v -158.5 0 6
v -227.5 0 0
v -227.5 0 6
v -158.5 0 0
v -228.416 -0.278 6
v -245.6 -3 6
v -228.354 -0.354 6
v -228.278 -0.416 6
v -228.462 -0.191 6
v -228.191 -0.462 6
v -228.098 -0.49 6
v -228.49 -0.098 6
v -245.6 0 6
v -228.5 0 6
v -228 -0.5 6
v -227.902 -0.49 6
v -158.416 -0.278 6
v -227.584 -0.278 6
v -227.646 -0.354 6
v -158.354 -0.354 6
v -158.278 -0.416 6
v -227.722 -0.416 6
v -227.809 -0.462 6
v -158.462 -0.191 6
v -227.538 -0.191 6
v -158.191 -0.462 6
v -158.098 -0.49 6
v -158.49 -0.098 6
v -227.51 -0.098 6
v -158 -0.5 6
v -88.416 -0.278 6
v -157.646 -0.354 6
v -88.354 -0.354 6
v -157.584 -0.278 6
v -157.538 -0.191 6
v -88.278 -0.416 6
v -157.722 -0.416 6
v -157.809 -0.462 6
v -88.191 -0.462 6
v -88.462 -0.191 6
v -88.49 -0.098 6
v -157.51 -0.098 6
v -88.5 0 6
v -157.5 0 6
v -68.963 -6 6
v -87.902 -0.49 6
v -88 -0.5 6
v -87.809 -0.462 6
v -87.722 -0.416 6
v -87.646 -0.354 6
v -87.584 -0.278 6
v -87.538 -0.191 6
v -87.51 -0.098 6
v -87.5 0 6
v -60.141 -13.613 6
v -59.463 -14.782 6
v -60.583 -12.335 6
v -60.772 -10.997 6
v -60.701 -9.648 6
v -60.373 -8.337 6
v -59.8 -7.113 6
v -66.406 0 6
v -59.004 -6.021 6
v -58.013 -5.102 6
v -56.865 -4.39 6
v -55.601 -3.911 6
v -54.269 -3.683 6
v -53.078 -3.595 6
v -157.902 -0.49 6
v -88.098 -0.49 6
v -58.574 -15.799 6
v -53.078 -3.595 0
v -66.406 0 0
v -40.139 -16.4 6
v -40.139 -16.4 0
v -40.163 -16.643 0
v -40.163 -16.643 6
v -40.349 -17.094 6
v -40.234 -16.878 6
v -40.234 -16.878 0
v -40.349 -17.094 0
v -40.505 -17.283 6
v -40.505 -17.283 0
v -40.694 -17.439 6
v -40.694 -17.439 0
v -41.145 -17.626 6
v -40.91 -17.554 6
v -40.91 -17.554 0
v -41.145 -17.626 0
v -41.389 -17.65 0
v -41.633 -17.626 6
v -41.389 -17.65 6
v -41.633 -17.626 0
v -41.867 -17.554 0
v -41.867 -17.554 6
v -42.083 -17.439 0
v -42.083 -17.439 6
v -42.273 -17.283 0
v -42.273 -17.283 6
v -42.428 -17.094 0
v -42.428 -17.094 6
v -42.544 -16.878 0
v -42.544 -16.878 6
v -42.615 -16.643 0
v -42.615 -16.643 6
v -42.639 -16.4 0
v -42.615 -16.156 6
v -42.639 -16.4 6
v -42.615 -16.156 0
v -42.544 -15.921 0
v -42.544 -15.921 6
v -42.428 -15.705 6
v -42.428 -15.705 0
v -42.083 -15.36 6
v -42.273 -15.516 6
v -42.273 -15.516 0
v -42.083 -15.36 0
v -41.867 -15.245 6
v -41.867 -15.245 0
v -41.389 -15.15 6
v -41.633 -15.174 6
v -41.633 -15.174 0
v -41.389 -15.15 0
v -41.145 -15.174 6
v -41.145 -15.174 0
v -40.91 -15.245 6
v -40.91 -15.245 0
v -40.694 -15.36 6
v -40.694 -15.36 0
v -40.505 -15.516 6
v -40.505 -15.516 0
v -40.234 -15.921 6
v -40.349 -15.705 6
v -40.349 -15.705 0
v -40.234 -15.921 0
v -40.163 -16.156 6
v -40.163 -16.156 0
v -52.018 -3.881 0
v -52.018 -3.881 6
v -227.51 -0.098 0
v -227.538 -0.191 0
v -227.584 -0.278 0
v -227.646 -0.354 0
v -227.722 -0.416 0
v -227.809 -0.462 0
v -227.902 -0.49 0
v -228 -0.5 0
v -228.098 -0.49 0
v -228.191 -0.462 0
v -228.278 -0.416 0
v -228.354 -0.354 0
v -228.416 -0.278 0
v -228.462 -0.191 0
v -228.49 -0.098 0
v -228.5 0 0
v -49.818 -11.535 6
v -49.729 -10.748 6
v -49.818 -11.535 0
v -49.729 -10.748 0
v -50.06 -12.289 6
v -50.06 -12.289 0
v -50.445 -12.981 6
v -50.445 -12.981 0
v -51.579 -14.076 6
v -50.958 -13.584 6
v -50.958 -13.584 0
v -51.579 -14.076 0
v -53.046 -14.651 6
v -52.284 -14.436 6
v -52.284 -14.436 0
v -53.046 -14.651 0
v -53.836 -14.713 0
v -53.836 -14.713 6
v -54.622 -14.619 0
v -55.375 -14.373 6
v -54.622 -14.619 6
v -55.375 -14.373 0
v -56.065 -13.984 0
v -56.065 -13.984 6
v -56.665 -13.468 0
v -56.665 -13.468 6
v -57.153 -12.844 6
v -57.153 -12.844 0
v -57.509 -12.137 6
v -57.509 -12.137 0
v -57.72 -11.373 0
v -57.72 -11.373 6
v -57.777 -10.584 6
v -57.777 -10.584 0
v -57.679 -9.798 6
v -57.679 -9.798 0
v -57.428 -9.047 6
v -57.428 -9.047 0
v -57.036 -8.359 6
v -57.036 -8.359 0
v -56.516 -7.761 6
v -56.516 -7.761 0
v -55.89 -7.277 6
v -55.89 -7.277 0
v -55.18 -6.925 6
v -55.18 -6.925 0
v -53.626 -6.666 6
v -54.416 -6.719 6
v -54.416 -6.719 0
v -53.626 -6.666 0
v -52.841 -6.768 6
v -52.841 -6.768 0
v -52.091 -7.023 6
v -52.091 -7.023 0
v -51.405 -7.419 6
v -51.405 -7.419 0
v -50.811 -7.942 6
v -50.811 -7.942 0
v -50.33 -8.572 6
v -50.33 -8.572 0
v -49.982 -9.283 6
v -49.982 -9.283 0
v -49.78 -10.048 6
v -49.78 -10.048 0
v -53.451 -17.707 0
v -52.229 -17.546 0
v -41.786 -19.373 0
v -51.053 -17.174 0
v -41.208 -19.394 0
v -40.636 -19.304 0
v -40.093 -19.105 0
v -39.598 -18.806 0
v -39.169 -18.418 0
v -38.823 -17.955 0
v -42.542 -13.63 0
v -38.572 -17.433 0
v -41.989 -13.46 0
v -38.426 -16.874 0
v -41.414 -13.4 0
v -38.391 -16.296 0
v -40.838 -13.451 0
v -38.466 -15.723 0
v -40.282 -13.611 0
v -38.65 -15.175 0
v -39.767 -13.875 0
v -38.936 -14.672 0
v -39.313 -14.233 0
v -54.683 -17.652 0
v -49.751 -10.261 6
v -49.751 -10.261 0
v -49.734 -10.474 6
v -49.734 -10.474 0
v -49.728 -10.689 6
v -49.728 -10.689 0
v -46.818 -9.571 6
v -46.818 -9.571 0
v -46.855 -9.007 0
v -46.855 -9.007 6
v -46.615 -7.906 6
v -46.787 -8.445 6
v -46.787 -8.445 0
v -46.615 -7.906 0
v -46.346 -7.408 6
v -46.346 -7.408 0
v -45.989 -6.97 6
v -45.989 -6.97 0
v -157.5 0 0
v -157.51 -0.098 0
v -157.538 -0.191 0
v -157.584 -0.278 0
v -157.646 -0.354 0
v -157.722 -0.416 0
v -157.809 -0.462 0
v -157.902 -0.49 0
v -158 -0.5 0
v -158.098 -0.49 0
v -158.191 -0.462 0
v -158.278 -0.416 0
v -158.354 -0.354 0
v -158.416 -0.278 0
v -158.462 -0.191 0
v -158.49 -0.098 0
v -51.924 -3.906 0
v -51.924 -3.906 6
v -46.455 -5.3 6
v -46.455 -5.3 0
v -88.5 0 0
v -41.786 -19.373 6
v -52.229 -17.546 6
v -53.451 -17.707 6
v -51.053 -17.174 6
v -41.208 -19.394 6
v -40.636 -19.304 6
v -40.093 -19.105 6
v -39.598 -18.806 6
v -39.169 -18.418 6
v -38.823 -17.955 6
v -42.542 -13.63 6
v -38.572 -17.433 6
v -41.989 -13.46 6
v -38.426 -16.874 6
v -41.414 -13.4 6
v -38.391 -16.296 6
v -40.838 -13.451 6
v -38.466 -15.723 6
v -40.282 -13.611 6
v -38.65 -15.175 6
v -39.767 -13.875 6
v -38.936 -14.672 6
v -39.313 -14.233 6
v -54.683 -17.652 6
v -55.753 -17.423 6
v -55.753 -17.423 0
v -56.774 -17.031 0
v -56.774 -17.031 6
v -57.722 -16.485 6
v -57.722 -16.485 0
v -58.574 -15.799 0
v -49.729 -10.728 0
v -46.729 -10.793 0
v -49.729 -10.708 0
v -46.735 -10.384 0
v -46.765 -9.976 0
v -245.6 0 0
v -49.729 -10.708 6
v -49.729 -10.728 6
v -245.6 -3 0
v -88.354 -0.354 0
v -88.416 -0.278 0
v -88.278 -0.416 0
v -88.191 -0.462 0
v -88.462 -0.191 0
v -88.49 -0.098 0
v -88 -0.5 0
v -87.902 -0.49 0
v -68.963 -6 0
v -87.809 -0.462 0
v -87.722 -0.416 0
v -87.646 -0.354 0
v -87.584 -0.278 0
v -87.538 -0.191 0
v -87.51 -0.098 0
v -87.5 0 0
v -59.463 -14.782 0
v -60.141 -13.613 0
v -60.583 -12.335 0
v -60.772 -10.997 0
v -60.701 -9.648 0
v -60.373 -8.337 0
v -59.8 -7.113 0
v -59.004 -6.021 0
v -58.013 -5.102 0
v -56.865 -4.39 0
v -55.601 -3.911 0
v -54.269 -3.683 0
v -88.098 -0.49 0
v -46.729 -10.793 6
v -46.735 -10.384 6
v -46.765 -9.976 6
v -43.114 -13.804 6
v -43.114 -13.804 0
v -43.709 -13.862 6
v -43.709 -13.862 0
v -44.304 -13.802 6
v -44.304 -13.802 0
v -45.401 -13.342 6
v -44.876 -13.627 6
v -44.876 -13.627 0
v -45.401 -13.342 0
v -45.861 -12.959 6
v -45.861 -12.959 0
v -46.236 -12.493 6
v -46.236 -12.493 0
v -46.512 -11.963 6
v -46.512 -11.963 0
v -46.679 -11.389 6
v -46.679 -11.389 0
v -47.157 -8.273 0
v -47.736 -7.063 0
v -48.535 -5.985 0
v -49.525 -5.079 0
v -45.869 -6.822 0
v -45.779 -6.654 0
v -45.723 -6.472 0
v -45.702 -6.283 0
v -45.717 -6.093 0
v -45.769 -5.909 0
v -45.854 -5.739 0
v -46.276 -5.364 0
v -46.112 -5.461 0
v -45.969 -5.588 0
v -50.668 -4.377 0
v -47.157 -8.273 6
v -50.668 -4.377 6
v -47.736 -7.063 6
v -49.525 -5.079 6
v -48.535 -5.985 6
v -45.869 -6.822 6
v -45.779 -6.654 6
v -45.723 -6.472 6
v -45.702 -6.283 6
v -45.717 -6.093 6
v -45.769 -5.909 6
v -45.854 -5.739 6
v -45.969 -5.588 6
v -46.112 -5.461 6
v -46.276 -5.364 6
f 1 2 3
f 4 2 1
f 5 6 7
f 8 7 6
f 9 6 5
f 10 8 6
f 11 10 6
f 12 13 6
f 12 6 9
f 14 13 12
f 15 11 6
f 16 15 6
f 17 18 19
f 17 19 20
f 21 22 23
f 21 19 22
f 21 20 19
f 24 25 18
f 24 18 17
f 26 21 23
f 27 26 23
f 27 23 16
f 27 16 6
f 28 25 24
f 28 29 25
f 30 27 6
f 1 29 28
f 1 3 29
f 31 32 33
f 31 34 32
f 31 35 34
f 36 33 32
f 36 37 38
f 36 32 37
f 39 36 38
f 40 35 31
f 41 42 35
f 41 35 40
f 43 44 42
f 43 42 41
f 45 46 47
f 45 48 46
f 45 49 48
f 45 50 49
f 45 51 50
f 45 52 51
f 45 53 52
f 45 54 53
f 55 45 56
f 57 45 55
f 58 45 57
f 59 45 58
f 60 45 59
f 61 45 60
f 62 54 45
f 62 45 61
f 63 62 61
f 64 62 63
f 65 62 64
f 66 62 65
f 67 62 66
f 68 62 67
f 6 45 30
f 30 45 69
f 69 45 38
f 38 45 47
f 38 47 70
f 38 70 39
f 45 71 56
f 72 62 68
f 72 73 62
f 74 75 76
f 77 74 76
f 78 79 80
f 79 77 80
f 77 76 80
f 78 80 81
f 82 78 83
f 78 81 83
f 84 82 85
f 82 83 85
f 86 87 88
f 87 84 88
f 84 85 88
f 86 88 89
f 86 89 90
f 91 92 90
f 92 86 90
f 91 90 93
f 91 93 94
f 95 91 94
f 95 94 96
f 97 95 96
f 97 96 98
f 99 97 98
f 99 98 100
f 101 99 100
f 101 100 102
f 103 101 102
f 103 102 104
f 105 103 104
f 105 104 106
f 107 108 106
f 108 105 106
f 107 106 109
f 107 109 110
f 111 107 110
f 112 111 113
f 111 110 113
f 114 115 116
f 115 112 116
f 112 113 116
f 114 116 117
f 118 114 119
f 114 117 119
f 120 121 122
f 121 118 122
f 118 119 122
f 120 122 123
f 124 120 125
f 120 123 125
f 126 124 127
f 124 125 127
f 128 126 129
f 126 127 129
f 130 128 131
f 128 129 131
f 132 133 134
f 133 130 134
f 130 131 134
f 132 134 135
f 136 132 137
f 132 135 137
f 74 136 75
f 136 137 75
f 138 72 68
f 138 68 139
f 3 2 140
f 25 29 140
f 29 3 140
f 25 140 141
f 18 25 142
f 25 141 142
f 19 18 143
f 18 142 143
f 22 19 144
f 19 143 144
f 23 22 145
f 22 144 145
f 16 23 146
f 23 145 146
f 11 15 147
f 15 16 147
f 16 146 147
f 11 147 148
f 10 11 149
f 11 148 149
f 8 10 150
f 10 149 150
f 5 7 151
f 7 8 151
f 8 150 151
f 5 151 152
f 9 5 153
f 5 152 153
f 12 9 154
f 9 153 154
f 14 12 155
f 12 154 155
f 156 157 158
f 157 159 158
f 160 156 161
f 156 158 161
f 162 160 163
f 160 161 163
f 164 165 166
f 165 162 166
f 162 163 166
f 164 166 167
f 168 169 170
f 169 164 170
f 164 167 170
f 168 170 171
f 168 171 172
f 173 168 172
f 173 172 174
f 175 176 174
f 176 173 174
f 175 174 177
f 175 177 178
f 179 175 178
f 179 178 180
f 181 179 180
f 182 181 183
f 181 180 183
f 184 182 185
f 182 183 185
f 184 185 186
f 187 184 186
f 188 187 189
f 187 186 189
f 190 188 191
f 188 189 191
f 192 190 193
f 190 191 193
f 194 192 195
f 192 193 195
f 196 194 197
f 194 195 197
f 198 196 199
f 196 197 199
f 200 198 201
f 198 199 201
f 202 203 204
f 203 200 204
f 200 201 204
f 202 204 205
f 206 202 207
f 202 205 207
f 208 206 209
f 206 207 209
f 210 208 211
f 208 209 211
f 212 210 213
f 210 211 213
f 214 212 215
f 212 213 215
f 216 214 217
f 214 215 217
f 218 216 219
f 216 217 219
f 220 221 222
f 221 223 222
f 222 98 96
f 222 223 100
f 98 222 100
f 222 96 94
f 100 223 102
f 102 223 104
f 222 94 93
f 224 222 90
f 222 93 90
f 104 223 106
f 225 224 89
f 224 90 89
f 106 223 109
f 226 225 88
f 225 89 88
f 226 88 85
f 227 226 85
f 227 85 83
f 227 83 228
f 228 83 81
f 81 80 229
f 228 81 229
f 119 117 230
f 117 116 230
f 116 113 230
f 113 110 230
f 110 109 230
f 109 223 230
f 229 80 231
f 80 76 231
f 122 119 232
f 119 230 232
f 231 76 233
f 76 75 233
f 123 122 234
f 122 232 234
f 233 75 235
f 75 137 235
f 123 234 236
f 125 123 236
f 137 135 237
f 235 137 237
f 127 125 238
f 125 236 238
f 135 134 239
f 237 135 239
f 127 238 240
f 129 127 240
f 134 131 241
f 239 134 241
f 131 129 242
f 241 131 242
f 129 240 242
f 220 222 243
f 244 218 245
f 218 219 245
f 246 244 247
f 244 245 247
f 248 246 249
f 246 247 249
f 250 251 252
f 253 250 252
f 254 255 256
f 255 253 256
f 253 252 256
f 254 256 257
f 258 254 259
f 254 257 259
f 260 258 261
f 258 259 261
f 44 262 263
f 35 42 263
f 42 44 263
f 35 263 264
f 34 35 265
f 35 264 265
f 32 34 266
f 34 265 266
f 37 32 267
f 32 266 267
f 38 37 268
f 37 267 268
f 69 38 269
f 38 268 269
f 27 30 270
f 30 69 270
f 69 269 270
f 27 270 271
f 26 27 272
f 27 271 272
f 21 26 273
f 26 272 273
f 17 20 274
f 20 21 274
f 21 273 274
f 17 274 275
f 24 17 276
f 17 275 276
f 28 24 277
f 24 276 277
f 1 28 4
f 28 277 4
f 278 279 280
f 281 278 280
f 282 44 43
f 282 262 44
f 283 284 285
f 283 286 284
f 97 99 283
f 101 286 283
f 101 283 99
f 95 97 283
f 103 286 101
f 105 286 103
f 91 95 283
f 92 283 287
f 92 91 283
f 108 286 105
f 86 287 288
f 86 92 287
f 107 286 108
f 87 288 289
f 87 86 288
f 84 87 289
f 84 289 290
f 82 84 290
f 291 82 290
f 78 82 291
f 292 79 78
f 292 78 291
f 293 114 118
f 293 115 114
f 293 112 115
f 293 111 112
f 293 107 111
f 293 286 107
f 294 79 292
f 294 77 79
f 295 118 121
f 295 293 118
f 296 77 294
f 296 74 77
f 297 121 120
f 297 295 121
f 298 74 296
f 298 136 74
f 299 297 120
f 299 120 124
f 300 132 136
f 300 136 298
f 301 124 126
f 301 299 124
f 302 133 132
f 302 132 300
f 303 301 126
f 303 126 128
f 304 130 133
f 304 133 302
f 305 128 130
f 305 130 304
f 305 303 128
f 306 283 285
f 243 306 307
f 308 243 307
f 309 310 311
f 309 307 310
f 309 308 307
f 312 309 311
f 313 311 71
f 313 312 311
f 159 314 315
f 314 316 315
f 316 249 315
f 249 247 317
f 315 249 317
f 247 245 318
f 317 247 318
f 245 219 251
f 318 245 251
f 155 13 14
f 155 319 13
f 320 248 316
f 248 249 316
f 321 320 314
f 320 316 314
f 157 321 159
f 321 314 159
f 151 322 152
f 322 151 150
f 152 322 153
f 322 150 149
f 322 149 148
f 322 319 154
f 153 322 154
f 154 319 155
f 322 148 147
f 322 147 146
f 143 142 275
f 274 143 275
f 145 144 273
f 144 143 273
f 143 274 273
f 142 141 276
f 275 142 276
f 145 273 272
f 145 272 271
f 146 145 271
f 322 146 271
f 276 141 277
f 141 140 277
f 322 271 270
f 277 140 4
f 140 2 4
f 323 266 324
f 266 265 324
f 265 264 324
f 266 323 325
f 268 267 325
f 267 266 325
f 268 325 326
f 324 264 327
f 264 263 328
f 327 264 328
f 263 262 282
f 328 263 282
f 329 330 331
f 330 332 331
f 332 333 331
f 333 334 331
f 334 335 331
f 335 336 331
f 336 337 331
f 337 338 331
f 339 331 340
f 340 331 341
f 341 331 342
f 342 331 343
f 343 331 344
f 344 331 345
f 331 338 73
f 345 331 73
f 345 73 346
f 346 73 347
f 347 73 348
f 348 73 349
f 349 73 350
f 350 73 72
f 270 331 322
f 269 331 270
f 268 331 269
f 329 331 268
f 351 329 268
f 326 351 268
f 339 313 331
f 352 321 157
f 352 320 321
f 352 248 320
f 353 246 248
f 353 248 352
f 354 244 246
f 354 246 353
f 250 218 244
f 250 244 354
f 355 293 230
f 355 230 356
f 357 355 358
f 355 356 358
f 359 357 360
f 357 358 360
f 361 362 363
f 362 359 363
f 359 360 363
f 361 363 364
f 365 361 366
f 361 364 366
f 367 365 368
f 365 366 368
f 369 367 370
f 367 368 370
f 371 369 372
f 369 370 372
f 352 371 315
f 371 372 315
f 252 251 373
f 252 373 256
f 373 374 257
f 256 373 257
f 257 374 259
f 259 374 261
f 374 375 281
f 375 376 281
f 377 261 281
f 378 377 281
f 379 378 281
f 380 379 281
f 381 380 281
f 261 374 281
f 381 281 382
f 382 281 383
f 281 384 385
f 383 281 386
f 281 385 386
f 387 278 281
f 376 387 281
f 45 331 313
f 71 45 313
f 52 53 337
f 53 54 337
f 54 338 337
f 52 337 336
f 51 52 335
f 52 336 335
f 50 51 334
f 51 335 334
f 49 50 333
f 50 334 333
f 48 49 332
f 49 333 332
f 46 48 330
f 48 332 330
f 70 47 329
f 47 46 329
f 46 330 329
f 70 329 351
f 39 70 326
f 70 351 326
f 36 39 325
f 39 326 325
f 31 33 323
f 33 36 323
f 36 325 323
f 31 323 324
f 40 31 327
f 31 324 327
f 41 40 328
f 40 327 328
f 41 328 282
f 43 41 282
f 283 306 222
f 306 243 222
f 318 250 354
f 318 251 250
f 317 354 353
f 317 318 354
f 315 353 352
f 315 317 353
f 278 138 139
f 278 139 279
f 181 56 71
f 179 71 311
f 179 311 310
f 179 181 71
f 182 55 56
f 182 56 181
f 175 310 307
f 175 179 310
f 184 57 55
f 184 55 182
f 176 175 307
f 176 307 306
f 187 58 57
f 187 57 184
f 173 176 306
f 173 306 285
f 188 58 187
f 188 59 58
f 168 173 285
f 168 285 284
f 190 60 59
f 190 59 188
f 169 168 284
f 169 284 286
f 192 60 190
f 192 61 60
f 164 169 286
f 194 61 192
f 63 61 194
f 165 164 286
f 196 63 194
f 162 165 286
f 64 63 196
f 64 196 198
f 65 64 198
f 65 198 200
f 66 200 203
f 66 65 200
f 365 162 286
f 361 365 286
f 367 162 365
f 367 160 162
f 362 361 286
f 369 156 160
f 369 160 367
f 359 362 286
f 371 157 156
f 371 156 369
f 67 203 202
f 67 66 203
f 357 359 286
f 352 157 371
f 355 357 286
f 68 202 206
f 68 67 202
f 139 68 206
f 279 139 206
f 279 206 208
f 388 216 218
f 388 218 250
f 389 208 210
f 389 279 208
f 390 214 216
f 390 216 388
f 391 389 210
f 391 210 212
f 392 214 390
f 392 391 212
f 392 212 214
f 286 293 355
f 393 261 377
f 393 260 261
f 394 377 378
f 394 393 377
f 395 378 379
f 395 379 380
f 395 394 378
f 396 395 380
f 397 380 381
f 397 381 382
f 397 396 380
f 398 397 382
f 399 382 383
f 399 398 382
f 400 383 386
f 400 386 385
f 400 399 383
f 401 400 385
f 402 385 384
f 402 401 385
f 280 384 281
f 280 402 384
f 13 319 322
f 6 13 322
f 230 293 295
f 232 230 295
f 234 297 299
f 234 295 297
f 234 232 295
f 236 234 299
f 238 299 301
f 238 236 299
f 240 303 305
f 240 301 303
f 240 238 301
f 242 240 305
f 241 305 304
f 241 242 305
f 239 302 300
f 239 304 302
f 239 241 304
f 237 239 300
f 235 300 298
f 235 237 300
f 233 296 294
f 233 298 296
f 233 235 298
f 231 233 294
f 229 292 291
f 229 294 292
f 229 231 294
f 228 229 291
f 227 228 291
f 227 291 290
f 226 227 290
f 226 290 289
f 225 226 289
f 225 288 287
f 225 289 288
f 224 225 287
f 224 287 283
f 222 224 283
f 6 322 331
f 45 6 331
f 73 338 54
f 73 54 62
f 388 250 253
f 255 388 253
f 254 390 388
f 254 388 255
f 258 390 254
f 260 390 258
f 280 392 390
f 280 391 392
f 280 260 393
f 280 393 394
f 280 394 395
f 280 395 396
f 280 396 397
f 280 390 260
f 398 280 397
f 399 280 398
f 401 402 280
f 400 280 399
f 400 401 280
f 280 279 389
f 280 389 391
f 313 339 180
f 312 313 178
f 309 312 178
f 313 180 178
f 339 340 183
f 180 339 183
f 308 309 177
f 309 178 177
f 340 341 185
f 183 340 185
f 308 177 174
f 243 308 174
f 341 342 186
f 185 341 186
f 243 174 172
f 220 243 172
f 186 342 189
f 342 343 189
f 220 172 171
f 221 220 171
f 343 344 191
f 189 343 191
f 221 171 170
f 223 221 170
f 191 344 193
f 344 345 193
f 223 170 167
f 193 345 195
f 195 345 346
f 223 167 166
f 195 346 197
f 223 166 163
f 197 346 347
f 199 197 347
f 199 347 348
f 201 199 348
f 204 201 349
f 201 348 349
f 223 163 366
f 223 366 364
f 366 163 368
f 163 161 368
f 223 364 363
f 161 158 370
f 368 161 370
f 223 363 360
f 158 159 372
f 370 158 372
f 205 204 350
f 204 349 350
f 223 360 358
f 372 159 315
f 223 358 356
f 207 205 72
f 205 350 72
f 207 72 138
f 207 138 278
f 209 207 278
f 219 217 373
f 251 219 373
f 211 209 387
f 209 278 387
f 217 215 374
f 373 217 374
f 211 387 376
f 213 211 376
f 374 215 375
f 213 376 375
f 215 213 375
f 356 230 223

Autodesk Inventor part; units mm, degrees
ref_plane "YZ Plane" through (0, 0, 0) normal (1, 0, 0) x (0, 1, 0)
ref_plane "XZ Plane" through (0, 0, 0) normal (0, 1, 0) x (-1, 0, 0)
ref_plane "XY Plane" through (0, 0, 0) normal (0, 0, 1) x (1, 0, 0)
sketch "スケッチ1" plane through (0, 0, 0) normal (0, 0, 1) x (1, 0, 0)
  line L0 (0, 0) -> (0, -3)
  line L1 (0, 0) -> (-15, 0)
  line L2 (-15, 0) -> (-15, -3)
  line L3 (-15, -3) -> (-30, -3)
  line L4 (-30, -3) -> (-30, 0)
  line L5 (-30, 0) -> (-45, 0)
  line L6 (-45, 0) -> (-45, -3)
  line L7 (-245.5996, 0) -> (-66.4062, 0)
  line L8 (-66.4062, 0) -> (-51.9242, -3.906)
  line L9 (-245.5996, 0) -> (-245.5996, -3)
  line L10 (-245.5996, -3) -> (-68.9626, -6)
  line L11 (-68.9626, -6) -> (-58.5737, -15.799)
  circle A0 centre (-53.7535, -10.6886) radius 4.025
  circle A1 centre (-53.7535, -10.6886) radius 1.5
  line L12 (0, -3) -> (0, -9)
  arc A2 (-54.2694, -3.6826) -> (-51.0532, -17.1739) centre (-53.7535, -10.6886) ccw
  line L13 (-54.2694, -3.6826) -> (-45, -3)
  line L14 (-51.0532, -17.1739) -> (-31.4218, -9)
  line L15 (-31.4218, -9) -> (0, -9)
  arc A3 (-46.7293, -10.7926) -> (-42.5418, -13.63) centre (-43.7046, -10.8374) ccw
  circle A4 centre (-43.7046, -10.8374) radius 1.5
  line L16 (-54.6828, -17.6519) -> (-41.7856, -19.3732)
  arc A5 (-41.7856, -19.3732) -> (-42.5418, -13.63) centre (-41.3887, -16.3996) ccw
  arc A6 (-58.5737, -15.799) -> (-54.6828, -17.6519) centre (-53.7535, -10.6886) ccw
  arc A7 (-46.7293, -10.7926) -> (-51.9242, -3.906) centre (-53.7535, -10.6886) ccw
  line L17 (-42, -3) -> (-33, -3)
  line L18 (-33, -3) -> (-33, -6)
  line L19 (-33, -6) -> (-42, -6)
  line L20 (-42, -6) -> (-42, -3)
  line L21 (-12, -3) -> (-3, -3)
  line L22 (-3, -3) -> (-3, -6)
  line L23 (-3, -6) -> (-12, -6)
  line L24 (-12, -6) -> (-12, -3)
  circle A8 centre (-40.95, -3) radius 1.05
  circle A9 centre (-34.05, -3) radius 1.05
  circle A10 centre (-34.05, -6) radius 1.05
  circle A11 centre (-40.95, -6) radius 1.05
  circle A12 centre (-10.95, -3) radius 1.05
  circle A13 centre (-4.05, -3) radius 1.05
  circle A14 centre (-4.05, -6) radius 1.05
  circle A15 centre (-10.95, -6) radius 1.05
  circle A16 centre (-28.95, -3) radius 1.05
  circle A17 centre (-16.05, -3) radius 1.05
  circle A18 centre (-41.3887, -16.3996) radius 1.25
  line L25 (-15.5802, -9) -> (-15.5802, -14)
  line L26 (-15.5802, -14) -> (-4.3492, -14)
  line L27 (-4.3492, -14) -> (-4.3492, -12)
  line L28 (-4.3492, -12) -> (-11.5802, -12)
  arc A19 (-11.5802, -9) -> (-11.5802, -12) centre (-11.5802, -10.5) ccw
  line L29 (-43.7046, -10.8374) -> (-53.7535, -10.6886)
  line L30 (-53.7535, -10.6886) -> (-43.8314, -9.0902)
  arc A20 (-43.0841, -6.159) -> (-46.8179, -9.5713) centre (-43.8314, -9.0902) ccw
  line L31 (-52.0181, -3.8813) -> (-43.0841, -6.159)
  circle A21 centre (-88, 0) radius 0.5
  circle A22 centre (-158, 0) radius 0.5
  circle A23 centre (-228, 0) radius 0.5
  point P0 (-5.1, -6)
  point P1 (-9.9, -6)
  point P2 (-12, -6)
  point P3 (-9.9, -3)
  point P4 (-5.1, -3)
  point P5 (-33, -3)
  point P6 (-33, -6)
  point P7 (-35.1, -6)
  point P8 (-39.9, -6)
  point P9 (-42, -6)
  point P10 (-42, -3)
  point P11 (-39.9, -3)
  point P12 (-35.1, -3)
  point P13 (-17.1, -3)
  point P14 (-27.9, -3)
  point P15 (-58.5737, -15.799)
  point P16 (-54.6828, -17.6519)
  point P17 (-51.9709, -3.8934)
  point P18 (-46.8179, -9.5713)
  point P19 (-87.5, 0)
  point P20 (-88.5, 0)
  point P21 (-157.5, 0)
  point P22 (-158.5, 0)
  point P23 (-227.5, 0)
  point P24 (-228.5, 0)
  dimension "d0" = 3
  dimension "d1" = 15
  dimension "d2" = 3
  dimension "d3" = 15
  dimension "d4" = 15
  dimension "d5" = 3
  dimension "d6" = 3
  dimension "d7" = 8.05
  dimension "d8" = 3
  dimension "d9" = 6
  dimension "d10" = 6
  dimension "d11" = 6.05
  dimension "d12" = 3
  dimension "d13" = 9
  dimension "d14" = 3
  dimension "d15" = 9
  dimension "d16" = 3
  dimension "d17" = 3
  dimension "d18" = 3
  dimension "d19" = 3
  dimension "d20" = 3
  dimension "d21" = 3
  dimension "d22" = 2.1
  dimension "d23" = 2.1
  dimension "d24" = 2.1
  dimension "d25" = 2.1
  dimension "d26" = 2.1
  dimension "d27" = 2.1
  dimension "d28" = 2.1
  dimension "d29" = 2.1
  dimension "d30" = 2.1
  dimension "d31" = 2.1
  dimension "d32" = 2.5
  dimension "d33" = 3
  dimension "d34" = 3
  dimension "d35" = 2
  dimension "d36" = 4
  dimension "d39" = 10
  dimension "d42" = 1
  dimension "d43" = 43
  dimension "d44" = 1
  dimension "d45" = 1
  dimension "d46" = 70
  dimension "d47" = 70
extrude "押し出し1" add sketch "スケッチ1" along normal blind 6 contours A5 L16 A2 L14 | L14 A2 L13 L8 A7 L30 A0 L29 A3 | L29 A0 L30 A7 | A7 L31 A20 | L11 L10 L9 L7 A23 A22 A21 L8 L13 A2
fillet "フィレット1" radius 1 1 edges at (-43.0841, -6.159, 3)
properties part number "シールド先端棒"
